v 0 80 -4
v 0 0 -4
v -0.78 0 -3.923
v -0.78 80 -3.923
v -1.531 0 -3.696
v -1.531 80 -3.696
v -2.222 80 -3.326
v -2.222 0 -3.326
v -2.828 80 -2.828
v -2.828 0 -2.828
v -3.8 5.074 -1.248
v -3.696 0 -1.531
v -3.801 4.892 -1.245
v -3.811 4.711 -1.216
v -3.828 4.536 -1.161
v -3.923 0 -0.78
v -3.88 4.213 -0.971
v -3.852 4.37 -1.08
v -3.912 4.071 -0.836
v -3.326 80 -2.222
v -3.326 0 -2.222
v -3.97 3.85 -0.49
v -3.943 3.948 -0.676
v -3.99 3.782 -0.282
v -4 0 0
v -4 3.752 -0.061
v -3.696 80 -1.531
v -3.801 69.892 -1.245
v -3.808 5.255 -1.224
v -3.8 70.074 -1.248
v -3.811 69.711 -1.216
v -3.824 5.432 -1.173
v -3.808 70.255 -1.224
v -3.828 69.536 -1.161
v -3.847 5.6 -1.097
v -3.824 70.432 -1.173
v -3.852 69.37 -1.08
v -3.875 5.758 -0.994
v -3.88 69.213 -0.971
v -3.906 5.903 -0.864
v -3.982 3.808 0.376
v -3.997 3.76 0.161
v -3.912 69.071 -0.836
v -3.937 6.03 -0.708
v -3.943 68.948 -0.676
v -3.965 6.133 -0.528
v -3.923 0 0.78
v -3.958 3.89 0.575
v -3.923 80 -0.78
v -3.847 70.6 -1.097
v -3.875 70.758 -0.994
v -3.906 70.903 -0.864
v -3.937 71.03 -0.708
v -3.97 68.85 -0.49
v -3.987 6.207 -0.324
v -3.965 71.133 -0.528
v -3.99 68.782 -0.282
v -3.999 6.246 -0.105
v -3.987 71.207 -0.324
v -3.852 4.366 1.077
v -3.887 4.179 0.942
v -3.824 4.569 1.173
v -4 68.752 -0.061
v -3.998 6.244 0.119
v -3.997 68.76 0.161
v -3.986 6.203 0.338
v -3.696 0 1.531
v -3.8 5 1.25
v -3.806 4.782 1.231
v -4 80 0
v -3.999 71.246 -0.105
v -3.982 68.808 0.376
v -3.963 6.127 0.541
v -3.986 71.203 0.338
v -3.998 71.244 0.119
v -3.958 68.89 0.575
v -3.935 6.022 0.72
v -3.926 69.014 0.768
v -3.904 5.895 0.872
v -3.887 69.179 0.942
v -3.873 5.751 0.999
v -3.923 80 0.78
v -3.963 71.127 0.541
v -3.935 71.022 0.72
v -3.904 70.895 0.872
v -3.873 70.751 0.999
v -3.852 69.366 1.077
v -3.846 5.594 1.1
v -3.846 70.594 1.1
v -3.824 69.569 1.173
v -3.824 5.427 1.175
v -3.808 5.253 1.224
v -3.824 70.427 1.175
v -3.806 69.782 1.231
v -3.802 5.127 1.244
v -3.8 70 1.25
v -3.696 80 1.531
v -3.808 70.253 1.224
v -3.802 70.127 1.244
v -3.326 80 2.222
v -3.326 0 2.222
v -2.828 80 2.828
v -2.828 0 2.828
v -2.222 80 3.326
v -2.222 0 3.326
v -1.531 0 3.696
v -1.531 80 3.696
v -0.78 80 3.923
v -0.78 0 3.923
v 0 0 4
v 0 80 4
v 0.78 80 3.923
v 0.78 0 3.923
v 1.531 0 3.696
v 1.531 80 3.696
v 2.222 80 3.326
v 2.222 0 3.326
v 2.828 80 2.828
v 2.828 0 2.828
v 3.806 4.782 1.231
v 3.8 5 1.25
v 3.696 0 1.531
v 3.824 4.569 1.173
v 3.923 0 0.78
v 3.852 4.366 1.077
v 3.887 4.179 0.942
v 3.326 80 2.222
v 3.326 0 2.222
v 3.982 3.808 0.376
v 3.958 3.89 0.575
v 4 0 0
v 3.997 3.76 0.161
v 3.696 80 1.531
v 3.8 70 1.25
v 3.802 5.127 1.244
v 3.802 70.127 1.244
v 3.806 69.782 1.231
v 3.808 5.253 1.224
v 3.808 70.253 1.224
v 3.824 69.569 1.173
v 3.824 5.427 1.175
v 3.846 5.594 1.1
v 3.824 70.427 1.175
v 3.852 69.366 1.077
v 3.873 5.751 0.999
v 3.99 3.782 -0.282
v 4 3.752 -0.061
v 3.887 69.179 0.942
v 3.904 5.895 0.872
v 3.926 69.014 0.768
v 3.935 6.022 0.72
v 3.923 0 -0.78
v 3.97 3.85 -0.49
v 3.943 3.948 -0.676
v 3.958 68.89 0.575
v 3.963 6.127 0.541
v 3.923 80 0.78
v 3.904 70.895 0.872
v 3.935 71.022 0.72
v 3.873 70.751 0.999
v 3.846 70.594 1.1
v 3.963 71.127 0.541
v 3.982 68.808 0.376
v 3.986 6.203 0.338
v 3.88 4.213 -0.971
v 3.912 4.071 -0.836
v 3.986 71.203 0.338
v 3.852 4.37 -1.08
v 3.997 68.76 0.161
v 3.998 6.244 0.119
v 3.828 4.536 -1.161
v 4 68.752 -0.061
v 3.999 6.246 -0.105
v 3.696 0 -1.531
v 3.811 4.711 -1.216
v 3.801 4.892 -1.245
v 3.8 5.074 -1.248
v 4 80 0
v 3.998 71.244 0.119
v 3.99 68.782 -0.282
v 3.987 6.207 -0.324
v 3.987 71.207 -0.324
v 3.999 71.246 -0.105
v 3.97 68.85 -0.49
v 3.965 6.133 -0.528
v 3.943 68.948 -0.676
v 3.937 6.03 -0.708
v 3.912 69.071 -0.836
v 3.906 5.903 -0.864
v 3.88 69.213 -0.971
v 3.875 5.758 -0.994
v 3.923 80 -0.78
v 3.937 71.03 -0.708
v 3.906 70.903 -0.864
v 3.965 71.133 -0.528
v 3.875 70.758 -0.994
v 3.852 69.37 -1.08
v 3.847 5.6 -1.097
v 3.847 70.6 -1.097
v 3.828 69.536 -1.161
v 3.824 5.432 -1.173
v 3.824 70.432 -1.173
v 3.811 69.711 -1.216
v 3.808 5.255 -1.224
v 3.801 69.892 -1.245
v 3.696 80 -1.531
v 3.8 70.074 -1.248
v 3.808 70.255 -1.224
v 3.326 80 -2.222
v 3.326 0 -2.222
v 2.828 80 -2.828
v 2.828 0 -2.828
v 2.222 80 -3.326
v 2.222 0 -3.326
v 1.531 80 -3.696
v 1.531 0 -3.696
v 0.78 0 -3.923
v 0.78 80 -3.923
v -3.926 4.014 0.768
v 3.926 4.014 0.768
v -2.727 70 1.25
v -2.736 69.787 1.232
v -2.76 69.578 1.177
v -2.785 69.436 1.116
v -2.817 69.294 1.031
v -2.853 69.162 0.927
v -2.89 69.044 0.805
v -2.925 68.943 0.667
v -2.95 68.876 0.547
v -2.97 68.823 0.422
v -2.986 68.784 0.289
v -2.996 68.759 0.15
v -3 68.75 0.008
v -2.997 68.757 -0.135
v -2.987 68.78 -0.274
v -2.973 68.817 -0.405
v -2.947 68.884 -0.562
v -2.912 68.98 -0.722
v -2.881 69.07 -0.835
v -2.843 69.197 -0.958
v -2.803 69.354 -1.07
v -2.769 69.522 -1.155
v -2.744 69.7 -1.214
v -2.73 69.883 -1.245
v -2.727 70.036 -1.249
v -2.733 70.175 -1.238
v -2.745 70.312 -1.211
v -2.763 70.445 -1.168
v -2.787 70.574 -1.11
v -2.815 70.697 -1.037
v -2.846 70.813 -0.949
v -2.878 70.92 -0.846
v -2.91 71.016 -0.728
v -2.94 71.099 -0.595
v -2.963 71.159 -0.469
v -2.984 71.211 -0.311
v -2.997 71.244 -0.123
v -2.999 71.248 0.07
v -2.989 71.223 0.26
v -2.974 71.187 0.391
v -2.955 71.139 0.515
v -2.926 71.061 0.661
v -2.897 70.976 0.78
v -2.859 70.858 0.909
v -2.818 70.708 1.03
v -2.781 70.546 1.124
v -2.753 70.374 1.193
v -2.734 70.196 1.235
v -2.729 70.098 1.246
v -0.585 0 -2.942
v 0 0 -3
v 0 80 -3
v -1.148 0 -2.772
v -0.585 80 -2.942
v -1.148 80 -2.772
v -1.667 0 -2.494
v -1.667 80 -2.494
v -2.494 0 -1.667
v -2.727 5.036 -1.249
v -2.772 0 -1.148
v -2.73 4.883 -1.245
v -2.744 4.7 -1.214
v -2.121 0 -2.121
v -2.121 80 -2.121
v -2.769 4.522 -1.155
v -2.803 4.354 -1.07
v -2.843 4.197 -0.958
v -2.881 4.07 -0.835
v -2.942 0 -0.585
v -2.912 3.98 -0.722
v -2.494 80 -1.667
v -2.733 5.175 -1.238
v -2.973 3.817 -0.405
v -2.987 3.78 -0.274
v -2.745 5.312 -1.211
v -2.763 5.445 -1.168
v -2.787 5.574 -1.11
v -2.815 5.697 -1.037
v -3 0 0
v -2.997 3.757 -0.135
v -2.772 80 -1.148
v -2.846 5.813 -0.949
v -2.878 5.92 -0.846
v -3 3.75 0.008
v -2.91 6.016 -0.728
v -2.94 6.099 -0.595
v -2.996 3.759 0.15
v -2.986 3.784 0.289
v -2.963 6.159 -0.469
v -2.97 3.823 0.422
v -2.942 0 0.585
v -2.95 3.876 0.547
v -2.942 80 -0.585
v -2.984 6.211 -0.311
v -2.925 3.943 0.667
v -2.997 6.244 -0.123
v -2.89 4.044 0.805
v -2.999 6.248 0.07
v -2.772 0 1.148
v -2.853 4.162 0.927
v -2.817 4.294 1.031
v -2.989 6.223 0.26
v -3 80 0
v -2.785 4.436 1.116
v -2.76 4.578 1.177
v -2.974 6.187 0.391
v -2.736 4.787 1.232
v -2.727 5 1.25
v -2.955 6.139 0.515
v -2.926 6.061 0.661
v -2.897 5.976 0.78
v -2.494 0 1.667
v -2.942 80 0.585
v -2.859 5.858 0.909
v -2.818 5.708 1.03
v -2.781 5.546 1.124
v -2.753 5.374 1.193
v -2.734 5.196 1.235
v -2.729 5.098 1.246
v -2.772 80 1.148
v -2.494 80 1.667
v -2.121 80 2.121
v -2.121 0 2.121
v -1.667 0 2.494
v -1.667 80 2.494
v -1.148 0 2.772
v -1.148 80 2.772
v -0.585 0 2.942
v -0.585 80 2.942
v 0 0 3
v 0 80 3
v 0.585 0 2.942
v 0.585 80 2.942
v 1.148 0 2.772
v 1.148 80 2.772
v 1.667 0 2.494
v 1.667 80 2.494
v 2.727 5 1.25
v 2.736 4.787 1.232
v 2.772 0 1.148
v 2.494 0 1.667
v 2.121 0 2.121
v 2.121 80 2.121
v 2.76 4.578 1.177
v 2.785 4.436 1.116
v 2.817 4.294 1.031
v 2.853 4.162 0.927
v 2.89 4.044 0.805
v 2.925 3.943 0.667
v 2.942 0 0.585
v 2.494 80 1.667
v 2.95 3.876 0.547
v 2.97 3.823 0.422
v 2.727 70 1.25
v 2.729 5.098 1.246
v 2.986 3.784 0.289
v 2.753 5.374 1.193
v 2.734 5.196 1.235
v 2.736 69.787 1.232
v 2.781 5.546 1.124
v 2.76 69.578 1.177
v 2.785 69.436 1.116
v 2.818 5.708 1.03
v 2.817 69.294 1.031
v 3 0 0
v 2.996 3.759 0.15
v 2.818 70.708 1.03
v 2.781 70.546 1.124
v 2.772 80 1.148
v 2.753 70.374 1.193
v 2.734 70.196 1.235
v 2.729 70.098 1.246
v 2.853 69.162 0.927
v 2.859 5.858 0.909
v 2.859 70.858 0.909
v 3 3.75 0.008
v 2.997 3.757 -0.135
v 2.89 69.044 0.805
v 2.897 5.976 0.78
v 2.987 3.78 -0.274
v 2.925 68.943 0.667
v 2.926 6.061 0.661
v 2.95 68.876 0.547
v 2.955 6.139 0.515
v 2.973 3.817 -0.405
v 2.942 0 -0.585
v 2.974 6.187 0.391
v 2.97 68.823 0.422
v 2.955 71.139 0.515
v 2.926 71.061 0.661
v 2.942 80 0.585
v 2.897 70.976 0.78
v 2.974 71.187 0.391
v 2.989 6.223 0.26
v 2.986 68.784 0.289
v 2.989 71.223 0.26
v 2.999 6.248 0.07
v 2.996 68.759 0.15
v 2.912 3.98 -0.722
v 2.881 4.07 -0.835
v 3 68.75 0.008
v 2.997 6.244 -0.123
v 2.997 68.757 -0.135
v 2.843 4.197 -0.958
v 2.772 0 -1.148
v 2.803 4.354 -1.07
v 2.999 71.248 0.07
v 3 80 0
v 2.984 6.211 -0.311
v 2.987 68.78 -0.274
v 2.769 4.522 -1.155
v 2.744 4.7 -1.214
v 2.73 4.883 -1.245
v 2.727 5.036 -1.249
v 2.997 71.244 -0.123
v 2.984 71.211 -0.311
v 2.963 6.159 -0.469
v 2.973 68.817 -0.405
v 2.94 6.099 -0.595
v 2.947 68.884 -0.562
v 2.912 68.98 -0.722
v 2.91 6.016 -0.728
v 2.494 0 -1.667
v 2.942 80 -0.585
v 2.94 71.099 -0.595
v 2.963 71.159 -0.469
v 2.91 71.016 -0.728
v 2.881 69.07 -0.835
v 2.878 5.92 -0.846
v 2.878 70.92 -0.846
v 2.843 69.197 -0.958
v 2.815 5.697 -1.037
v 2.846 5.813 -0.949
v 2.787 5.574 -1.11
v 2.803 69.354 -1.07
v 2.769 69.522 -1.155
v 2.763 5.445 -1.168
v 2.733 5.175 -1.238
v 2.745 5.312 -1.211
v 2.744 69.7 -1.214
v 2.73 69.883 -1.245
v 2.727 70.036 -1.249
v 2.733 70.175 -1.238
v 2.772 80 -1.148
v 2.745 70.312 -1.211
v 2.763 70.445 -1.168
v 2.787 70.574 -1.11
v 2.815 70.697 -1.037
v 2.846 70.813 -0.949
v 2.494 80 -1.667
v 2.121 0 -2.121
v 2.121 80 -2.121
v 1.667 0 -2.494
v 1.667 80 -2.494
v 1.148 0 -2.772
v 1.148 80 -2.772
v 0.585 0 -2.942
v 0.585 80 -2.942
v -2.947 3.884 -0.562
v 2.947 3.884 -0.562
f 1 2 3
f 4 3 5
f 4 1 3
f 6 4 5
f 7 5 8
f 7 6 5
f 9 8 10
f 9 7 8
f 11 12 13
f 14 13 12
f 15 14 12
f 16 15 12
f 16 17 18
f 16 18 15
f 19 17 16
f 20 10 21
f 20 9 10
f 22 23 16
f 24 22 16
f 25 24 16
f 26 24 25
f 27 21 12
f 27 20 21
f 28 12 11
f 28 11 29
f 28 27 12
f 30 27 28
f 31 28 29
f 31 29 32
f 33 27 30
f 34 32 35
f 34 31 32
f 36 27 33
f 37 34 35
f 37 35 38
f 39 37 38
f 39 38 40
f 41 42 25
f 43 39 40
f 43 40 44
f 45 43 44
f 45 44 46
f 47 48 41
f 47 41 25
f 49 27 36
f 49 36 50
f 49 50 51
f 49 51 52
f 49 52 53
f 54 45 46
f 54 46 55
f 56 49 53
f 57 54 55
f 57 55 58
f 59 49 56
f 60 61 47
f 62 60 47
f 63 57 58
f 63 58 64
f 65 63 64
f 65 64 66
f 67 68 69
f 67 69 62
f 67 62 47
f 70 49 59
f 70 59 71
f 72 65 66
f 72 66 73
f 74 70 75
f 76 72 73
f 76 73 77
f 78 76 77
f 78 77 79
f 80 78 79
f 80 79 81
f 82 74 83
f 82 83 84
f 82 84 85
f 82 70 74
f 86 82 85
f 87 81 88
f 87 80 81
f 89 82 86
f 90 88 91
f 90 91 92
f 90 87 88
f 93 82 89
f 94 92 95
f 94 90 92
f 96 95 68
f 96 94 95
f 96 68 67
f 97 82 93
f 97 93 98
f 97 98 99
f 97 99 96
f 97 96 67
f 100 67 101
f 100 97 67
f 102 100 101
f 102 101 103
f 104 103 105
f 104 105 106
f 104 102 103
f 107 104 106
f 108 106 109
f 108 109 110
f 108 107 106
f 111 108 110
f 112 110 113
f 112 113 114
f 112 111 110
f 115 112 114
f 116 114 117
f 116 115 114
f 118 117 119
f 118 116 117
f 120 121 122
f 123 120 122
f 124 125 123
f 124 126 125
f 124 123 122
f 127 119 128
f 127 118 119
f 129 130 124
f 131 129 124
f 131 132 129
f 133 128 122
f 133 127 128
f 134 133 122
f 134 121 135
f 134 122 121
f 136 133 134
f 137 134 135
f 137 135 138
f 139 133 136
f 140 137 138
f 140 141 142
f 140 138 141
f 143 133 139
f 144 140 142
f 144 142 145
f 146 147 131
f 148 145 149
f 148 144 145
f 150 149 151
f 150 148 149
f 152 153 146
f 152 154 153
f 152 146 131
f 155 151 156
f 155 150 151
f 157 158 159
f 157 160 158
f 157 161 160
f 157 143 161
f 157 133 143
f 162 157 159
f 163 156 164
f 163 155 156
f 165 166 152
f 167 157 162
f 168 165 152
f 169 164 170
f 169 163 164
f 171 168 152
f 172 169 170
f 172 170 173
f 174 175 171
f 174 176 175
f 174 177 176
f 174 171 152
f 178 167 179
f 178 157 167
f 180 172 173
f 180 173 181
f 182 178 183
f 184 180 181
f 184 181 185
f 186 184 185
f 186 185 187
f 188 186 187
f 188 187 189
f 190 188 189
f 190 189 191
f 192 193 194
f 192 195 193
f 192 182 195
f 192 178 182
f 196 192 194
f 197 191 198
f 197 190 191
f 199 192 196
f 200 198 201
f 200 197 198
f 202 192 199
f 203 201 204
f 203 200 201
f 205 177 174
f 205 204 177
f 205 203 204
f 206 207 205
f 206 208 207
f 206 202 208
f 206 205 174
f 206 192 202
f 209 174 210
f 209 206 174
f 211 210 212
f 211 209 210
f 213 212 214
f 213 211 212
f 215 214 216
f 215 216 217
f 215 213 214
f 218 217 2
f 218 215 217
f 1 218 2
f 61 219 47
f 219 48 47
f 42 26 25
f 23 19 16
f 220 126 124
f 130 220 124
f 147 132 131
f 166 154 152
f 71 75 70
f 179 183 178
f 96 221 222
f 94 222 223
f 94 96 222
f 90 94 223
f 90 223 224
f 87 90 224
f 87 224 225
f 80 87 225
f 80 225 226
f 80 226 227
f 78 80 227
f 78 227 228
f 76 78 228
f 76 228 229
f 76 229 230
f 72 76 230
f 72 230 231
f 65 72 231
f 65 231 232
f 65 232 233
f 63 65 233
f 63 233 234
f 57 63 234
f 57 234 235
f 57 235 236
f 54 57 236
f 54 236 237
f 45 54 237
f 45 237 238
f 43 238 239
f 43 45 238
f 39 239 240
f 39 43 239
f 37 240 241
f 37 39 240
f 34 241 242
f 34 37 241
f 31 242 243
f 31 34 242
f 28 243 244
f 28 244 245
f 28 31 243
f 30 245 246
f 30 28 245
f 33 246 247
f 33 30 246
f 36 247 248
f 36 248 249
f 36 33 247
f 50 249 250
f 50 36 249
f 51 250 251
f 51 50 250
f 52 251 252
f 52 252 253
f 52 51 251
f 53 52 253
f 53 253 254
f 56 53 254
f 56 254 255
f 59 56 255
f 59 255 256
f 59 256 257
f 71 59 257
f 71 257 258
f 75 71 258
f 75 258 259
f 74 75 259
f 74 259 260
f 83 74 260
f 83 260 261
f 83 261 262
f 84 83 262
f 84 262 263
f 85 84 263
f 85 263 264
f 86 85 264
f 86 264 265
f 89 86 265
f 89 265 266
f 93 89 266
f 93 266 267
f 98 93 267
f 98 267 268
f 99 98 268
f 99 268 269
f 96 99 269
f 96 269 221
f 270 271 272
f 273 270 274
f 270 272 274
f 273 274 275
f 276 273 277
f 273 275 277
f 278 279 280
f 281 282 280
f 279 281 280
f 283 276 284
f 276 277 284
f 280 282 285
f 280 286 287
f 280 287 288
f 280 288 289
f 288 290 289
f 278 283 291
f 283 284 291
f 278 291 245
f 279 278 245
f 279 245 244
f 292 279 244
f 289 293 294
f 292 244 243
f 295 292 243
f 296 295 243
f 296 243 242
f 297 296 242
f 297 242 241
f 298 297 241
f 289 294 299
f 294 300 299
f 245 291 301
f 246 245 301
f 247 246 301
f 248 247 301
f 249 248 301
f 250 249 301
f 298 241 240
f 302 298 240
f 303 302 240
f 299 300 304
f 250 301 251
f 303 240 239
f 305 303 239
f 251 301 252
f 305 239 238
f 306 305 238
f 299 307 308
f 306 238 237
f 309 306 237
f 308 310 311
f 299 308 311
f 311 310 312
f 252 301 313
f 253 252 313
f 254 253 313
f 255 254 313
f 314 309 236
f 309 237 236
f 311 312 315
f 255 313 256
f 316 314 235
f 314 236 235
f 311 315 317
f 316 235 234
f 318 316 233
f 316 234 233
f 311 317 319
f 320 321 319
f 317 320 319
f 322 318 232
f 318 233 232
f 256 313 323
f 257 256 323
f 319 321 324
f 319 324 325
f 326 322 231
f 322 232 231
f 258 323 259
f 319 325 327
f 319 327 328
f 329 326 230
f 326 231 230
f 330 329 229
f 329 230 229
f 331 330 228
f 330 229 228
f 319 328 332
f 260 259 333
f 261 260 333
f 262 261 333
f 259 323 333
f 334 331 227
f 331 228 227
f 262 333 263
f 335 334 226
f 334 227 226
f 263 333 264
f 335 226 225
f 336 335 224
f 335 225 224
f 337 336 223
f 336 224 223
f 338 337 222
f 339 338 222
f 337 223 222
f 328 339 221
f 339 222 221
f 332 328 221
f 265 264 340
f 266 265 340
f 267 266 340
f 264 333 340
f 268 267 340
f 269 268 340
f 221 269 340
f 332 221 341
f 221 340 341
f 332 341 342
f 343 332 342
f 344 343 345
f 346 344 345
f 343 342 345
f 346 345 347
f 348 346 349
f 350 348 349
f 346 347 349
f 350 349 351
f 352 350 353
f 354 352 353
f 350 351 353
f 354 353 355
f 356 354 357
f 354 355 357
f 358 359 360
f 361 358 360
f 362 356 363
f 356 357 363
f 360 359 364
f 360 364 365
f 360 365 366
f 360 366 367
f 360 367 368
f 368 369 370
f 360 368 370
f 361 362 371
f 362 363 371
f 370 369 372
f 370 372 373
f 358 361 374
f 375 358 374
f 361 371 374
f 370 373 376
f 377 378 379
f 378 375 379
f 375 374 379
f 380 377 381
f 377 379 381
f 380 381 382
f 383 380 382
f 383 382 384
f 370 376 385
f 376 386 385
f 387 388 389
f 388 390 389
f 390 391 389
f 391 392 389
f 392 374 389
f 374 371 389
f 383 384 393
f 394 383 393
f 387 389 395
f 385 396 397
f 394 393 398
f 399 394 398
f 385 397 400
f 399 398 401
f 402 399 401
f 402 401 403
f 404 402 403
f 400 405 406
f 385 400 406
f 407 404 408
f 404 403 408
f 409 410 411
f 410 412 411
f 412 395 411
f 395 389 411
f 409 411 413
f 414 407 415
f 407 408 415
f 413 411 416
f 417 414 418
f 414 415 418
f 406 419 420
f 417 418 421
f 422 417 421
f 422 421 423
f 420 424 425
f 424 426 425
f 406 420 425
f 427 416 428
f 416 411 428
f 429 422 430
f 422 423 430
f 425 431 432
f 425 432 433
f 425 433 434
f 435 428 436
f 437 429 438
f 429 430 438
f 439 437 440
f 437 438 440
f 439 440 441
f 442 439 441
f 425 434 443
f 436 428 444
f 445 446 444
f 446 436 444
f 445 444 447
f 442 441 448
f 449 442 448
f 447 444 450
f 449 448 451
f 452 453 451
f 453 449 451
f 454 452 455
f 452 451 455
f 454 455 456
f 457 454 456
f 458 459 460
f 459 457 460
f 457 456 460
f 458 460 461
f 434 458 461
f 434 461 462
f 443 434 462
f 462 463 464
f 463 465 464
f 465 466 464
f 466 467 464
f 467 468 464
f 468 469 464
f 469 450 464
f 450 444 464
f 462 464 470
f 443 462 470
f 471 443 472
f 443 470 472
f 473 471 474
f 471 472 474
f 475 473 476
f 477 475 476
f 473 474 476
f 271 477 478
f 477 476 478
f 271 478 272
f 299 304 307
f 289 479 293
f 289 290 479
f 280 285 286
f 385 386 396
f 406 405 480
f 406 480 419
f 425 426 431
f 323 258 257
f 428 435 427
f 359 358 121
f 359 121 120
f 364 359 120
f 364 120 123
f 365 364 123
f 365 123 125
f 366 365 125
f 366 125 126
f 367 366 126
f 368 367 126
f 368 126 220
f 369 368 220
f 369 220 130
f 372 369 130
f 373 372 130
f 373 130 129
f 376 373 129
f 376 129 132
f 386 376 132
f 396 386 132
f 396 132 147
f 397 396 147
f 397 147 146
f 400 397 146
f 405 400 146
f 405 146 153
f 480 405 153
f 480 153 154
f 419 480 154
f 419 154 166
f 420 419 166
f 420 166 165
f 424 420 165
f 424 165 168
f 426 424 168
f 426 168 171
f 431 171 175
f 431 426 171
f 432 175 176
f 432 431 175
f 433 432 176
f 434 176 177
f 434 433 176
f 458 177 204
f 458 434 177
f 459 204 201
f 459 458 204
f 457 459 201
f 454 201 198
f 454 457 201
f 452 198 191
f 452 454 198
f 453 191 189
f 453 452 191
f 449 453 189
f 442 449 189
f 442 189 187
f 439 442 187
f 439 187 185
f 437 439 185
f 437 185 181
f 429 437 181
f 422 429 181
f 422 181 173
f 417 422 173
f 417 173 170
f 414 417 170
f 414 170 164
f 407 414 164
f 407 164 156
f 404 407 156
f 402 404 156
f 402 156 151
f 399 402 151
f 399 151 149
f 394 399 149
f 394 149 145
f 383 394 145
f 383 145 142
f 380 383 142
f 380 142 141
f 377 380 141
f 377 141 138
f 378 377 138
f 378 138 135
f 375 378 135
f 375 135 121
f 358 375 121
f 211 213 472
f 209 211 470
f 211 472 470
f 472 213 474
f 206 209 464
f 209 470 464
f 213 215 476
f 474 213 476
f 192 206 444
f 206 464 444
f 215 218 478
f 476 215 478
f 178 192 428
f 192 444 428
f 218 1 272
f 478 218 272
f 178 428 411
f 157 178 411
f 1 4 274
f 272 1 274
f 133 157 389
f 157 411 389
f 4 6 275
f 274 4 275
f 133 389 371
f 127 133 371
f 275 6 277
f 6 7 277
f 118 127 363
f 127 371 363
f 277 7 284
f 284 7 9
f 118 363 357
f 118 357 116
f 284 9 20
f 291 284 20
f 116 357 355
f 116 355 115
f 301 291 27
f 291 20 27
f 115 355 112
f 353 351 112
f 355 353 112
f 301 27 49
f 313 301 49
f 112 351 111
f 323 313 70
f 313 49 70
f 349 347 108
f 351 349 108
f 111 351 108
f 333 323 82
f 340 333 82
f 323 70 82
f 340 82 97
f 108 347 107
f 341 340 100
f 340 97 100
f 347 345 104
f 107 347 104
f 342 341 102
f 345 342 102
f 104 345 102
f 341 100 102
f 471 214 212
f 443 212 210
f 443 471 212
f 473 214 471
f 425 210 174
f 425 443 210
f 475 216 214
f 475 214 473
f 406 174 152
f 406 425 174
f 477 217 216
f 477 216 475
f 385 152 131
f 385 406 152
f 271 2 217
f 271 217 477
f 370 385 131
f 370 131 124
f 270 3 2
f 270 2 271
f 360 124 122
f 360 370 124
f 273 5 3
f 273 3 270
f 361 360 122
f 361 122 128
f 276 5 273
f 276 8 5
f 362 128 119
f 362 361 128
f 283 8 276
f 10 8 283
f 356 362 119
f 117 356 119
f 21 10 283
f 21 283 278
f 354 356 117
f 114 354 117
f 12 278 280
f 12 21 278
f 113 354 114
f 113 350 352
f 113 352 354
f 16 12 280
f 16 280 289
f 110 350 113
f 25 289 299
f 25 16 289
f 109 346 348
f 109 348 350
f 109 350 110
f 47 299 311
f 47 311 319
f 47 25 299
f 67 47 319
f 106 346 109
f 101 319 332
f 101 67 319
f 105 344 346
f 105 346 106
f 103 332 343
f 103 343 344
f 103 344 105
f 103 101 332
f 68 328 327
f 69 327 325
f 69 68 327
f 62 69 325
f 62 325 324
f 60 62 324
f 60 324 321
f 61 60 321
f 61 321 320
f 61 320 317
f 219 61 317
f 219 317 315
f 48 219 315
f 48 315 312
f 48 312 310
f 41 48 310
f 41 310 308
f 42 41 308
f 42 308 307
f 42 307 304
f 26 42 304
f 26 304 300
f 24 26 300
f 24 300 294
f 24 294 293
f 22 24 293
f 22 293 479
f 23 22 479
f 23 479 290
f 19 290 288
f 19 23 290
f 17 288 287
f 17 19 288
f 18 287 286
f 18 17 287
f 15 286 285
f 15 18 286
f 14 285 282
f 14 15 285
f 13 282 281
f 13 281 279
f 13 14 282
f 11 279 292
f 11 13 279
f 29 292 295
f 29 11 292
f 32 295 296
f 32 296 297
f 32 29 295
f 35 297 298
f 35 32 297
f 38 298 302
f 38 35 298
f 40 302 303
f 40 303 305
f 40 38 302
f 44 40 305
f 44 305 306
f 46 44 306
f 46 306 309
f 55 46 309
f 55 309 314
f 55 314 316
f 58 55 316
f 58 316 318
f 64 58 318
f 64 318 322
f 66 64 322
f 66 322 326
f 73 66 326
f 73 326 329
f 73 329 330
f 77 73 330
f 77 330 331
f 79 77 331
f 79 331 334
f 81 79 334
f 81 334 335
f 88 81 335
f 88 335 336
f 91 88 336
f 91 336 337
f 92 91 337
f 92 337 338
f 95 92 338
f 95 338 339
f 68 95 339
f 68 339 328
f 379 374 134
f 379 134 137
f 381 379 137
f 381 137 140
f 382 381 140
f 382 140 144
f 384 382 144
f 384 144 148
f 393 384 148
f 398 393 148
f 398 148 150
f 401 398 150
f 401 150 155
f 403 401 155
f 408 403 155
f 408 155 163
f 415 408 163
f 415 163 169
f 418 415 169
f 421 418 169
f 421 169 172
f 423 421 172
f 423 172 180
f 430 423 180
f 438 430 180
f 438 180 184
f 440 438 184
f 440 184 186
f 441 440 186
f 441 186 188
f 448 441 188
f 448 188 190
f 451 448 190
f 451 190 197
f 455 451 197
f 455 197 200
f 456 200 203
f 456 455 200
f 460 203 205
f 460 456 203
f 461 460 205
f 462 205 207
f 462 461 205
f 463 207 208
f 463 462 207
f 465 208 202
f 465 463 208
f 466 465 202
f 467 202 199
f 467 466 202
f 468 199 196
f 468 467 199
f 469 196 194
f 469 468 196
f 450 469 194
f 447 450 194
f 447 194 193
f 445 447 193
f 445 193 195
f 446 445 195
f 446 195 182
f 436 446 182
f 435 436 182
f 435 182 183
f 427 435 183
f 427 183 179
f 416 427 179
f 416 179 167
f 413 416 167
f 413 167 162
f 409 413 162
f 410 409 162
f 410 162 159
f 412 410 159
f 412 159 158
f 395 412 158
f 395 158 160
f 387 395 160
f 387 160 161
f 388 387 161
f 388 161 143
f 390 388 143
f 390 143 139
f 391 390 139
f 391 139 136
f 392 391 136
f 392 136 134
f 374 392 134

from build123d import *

# Parameters (mm, degrees)
SKETCH2_W               = 1
SKETCH2_H               = 80
CUT_EXTRUDE1_DEPTH      = 81.199750623
CUT_EXTRUDE1_DEPTH_BACK = 81.199750623
SKETCH3_R               = 1.25


with BuildPart() as part:
    # Sketch2 → revolve 1 (revolve)
    with BuildSketch(Plane(origin=(0, 0, 0), x_dir=(0, 0, -1), z_dir=(1, 0, 0))):
        with Locations((3.5, 40)):
            Rectangle(SKETCH2_W, SKETCH2_H)
    revolve(axis=Axis((0, 0, 0), (0, 1, 0)))

    # Sketch3 → Cut-Extrude1 (cut, two sides: drawn at the far end of the back side and taken through both)
    with BuildSketch(Plane(origin=(0, 0, 0), x_dir=(0, 0, -1), z_dir=(1, 0, 0)).offset(-CUT_EXTRUDE1_DEPTH_BACK)):
        with Locations((0, 5)):
            Circle(SKETCH3_R)
        with Locations((0, 70)):
            Circle(SKETCH3_R)
    extrude(amount=CUT_EXTRUDE1_DEPTH + CUT_EXTRUDE1_DEPTH_BACK, mode=Mode.SUBTRACT)


solid = part.part
